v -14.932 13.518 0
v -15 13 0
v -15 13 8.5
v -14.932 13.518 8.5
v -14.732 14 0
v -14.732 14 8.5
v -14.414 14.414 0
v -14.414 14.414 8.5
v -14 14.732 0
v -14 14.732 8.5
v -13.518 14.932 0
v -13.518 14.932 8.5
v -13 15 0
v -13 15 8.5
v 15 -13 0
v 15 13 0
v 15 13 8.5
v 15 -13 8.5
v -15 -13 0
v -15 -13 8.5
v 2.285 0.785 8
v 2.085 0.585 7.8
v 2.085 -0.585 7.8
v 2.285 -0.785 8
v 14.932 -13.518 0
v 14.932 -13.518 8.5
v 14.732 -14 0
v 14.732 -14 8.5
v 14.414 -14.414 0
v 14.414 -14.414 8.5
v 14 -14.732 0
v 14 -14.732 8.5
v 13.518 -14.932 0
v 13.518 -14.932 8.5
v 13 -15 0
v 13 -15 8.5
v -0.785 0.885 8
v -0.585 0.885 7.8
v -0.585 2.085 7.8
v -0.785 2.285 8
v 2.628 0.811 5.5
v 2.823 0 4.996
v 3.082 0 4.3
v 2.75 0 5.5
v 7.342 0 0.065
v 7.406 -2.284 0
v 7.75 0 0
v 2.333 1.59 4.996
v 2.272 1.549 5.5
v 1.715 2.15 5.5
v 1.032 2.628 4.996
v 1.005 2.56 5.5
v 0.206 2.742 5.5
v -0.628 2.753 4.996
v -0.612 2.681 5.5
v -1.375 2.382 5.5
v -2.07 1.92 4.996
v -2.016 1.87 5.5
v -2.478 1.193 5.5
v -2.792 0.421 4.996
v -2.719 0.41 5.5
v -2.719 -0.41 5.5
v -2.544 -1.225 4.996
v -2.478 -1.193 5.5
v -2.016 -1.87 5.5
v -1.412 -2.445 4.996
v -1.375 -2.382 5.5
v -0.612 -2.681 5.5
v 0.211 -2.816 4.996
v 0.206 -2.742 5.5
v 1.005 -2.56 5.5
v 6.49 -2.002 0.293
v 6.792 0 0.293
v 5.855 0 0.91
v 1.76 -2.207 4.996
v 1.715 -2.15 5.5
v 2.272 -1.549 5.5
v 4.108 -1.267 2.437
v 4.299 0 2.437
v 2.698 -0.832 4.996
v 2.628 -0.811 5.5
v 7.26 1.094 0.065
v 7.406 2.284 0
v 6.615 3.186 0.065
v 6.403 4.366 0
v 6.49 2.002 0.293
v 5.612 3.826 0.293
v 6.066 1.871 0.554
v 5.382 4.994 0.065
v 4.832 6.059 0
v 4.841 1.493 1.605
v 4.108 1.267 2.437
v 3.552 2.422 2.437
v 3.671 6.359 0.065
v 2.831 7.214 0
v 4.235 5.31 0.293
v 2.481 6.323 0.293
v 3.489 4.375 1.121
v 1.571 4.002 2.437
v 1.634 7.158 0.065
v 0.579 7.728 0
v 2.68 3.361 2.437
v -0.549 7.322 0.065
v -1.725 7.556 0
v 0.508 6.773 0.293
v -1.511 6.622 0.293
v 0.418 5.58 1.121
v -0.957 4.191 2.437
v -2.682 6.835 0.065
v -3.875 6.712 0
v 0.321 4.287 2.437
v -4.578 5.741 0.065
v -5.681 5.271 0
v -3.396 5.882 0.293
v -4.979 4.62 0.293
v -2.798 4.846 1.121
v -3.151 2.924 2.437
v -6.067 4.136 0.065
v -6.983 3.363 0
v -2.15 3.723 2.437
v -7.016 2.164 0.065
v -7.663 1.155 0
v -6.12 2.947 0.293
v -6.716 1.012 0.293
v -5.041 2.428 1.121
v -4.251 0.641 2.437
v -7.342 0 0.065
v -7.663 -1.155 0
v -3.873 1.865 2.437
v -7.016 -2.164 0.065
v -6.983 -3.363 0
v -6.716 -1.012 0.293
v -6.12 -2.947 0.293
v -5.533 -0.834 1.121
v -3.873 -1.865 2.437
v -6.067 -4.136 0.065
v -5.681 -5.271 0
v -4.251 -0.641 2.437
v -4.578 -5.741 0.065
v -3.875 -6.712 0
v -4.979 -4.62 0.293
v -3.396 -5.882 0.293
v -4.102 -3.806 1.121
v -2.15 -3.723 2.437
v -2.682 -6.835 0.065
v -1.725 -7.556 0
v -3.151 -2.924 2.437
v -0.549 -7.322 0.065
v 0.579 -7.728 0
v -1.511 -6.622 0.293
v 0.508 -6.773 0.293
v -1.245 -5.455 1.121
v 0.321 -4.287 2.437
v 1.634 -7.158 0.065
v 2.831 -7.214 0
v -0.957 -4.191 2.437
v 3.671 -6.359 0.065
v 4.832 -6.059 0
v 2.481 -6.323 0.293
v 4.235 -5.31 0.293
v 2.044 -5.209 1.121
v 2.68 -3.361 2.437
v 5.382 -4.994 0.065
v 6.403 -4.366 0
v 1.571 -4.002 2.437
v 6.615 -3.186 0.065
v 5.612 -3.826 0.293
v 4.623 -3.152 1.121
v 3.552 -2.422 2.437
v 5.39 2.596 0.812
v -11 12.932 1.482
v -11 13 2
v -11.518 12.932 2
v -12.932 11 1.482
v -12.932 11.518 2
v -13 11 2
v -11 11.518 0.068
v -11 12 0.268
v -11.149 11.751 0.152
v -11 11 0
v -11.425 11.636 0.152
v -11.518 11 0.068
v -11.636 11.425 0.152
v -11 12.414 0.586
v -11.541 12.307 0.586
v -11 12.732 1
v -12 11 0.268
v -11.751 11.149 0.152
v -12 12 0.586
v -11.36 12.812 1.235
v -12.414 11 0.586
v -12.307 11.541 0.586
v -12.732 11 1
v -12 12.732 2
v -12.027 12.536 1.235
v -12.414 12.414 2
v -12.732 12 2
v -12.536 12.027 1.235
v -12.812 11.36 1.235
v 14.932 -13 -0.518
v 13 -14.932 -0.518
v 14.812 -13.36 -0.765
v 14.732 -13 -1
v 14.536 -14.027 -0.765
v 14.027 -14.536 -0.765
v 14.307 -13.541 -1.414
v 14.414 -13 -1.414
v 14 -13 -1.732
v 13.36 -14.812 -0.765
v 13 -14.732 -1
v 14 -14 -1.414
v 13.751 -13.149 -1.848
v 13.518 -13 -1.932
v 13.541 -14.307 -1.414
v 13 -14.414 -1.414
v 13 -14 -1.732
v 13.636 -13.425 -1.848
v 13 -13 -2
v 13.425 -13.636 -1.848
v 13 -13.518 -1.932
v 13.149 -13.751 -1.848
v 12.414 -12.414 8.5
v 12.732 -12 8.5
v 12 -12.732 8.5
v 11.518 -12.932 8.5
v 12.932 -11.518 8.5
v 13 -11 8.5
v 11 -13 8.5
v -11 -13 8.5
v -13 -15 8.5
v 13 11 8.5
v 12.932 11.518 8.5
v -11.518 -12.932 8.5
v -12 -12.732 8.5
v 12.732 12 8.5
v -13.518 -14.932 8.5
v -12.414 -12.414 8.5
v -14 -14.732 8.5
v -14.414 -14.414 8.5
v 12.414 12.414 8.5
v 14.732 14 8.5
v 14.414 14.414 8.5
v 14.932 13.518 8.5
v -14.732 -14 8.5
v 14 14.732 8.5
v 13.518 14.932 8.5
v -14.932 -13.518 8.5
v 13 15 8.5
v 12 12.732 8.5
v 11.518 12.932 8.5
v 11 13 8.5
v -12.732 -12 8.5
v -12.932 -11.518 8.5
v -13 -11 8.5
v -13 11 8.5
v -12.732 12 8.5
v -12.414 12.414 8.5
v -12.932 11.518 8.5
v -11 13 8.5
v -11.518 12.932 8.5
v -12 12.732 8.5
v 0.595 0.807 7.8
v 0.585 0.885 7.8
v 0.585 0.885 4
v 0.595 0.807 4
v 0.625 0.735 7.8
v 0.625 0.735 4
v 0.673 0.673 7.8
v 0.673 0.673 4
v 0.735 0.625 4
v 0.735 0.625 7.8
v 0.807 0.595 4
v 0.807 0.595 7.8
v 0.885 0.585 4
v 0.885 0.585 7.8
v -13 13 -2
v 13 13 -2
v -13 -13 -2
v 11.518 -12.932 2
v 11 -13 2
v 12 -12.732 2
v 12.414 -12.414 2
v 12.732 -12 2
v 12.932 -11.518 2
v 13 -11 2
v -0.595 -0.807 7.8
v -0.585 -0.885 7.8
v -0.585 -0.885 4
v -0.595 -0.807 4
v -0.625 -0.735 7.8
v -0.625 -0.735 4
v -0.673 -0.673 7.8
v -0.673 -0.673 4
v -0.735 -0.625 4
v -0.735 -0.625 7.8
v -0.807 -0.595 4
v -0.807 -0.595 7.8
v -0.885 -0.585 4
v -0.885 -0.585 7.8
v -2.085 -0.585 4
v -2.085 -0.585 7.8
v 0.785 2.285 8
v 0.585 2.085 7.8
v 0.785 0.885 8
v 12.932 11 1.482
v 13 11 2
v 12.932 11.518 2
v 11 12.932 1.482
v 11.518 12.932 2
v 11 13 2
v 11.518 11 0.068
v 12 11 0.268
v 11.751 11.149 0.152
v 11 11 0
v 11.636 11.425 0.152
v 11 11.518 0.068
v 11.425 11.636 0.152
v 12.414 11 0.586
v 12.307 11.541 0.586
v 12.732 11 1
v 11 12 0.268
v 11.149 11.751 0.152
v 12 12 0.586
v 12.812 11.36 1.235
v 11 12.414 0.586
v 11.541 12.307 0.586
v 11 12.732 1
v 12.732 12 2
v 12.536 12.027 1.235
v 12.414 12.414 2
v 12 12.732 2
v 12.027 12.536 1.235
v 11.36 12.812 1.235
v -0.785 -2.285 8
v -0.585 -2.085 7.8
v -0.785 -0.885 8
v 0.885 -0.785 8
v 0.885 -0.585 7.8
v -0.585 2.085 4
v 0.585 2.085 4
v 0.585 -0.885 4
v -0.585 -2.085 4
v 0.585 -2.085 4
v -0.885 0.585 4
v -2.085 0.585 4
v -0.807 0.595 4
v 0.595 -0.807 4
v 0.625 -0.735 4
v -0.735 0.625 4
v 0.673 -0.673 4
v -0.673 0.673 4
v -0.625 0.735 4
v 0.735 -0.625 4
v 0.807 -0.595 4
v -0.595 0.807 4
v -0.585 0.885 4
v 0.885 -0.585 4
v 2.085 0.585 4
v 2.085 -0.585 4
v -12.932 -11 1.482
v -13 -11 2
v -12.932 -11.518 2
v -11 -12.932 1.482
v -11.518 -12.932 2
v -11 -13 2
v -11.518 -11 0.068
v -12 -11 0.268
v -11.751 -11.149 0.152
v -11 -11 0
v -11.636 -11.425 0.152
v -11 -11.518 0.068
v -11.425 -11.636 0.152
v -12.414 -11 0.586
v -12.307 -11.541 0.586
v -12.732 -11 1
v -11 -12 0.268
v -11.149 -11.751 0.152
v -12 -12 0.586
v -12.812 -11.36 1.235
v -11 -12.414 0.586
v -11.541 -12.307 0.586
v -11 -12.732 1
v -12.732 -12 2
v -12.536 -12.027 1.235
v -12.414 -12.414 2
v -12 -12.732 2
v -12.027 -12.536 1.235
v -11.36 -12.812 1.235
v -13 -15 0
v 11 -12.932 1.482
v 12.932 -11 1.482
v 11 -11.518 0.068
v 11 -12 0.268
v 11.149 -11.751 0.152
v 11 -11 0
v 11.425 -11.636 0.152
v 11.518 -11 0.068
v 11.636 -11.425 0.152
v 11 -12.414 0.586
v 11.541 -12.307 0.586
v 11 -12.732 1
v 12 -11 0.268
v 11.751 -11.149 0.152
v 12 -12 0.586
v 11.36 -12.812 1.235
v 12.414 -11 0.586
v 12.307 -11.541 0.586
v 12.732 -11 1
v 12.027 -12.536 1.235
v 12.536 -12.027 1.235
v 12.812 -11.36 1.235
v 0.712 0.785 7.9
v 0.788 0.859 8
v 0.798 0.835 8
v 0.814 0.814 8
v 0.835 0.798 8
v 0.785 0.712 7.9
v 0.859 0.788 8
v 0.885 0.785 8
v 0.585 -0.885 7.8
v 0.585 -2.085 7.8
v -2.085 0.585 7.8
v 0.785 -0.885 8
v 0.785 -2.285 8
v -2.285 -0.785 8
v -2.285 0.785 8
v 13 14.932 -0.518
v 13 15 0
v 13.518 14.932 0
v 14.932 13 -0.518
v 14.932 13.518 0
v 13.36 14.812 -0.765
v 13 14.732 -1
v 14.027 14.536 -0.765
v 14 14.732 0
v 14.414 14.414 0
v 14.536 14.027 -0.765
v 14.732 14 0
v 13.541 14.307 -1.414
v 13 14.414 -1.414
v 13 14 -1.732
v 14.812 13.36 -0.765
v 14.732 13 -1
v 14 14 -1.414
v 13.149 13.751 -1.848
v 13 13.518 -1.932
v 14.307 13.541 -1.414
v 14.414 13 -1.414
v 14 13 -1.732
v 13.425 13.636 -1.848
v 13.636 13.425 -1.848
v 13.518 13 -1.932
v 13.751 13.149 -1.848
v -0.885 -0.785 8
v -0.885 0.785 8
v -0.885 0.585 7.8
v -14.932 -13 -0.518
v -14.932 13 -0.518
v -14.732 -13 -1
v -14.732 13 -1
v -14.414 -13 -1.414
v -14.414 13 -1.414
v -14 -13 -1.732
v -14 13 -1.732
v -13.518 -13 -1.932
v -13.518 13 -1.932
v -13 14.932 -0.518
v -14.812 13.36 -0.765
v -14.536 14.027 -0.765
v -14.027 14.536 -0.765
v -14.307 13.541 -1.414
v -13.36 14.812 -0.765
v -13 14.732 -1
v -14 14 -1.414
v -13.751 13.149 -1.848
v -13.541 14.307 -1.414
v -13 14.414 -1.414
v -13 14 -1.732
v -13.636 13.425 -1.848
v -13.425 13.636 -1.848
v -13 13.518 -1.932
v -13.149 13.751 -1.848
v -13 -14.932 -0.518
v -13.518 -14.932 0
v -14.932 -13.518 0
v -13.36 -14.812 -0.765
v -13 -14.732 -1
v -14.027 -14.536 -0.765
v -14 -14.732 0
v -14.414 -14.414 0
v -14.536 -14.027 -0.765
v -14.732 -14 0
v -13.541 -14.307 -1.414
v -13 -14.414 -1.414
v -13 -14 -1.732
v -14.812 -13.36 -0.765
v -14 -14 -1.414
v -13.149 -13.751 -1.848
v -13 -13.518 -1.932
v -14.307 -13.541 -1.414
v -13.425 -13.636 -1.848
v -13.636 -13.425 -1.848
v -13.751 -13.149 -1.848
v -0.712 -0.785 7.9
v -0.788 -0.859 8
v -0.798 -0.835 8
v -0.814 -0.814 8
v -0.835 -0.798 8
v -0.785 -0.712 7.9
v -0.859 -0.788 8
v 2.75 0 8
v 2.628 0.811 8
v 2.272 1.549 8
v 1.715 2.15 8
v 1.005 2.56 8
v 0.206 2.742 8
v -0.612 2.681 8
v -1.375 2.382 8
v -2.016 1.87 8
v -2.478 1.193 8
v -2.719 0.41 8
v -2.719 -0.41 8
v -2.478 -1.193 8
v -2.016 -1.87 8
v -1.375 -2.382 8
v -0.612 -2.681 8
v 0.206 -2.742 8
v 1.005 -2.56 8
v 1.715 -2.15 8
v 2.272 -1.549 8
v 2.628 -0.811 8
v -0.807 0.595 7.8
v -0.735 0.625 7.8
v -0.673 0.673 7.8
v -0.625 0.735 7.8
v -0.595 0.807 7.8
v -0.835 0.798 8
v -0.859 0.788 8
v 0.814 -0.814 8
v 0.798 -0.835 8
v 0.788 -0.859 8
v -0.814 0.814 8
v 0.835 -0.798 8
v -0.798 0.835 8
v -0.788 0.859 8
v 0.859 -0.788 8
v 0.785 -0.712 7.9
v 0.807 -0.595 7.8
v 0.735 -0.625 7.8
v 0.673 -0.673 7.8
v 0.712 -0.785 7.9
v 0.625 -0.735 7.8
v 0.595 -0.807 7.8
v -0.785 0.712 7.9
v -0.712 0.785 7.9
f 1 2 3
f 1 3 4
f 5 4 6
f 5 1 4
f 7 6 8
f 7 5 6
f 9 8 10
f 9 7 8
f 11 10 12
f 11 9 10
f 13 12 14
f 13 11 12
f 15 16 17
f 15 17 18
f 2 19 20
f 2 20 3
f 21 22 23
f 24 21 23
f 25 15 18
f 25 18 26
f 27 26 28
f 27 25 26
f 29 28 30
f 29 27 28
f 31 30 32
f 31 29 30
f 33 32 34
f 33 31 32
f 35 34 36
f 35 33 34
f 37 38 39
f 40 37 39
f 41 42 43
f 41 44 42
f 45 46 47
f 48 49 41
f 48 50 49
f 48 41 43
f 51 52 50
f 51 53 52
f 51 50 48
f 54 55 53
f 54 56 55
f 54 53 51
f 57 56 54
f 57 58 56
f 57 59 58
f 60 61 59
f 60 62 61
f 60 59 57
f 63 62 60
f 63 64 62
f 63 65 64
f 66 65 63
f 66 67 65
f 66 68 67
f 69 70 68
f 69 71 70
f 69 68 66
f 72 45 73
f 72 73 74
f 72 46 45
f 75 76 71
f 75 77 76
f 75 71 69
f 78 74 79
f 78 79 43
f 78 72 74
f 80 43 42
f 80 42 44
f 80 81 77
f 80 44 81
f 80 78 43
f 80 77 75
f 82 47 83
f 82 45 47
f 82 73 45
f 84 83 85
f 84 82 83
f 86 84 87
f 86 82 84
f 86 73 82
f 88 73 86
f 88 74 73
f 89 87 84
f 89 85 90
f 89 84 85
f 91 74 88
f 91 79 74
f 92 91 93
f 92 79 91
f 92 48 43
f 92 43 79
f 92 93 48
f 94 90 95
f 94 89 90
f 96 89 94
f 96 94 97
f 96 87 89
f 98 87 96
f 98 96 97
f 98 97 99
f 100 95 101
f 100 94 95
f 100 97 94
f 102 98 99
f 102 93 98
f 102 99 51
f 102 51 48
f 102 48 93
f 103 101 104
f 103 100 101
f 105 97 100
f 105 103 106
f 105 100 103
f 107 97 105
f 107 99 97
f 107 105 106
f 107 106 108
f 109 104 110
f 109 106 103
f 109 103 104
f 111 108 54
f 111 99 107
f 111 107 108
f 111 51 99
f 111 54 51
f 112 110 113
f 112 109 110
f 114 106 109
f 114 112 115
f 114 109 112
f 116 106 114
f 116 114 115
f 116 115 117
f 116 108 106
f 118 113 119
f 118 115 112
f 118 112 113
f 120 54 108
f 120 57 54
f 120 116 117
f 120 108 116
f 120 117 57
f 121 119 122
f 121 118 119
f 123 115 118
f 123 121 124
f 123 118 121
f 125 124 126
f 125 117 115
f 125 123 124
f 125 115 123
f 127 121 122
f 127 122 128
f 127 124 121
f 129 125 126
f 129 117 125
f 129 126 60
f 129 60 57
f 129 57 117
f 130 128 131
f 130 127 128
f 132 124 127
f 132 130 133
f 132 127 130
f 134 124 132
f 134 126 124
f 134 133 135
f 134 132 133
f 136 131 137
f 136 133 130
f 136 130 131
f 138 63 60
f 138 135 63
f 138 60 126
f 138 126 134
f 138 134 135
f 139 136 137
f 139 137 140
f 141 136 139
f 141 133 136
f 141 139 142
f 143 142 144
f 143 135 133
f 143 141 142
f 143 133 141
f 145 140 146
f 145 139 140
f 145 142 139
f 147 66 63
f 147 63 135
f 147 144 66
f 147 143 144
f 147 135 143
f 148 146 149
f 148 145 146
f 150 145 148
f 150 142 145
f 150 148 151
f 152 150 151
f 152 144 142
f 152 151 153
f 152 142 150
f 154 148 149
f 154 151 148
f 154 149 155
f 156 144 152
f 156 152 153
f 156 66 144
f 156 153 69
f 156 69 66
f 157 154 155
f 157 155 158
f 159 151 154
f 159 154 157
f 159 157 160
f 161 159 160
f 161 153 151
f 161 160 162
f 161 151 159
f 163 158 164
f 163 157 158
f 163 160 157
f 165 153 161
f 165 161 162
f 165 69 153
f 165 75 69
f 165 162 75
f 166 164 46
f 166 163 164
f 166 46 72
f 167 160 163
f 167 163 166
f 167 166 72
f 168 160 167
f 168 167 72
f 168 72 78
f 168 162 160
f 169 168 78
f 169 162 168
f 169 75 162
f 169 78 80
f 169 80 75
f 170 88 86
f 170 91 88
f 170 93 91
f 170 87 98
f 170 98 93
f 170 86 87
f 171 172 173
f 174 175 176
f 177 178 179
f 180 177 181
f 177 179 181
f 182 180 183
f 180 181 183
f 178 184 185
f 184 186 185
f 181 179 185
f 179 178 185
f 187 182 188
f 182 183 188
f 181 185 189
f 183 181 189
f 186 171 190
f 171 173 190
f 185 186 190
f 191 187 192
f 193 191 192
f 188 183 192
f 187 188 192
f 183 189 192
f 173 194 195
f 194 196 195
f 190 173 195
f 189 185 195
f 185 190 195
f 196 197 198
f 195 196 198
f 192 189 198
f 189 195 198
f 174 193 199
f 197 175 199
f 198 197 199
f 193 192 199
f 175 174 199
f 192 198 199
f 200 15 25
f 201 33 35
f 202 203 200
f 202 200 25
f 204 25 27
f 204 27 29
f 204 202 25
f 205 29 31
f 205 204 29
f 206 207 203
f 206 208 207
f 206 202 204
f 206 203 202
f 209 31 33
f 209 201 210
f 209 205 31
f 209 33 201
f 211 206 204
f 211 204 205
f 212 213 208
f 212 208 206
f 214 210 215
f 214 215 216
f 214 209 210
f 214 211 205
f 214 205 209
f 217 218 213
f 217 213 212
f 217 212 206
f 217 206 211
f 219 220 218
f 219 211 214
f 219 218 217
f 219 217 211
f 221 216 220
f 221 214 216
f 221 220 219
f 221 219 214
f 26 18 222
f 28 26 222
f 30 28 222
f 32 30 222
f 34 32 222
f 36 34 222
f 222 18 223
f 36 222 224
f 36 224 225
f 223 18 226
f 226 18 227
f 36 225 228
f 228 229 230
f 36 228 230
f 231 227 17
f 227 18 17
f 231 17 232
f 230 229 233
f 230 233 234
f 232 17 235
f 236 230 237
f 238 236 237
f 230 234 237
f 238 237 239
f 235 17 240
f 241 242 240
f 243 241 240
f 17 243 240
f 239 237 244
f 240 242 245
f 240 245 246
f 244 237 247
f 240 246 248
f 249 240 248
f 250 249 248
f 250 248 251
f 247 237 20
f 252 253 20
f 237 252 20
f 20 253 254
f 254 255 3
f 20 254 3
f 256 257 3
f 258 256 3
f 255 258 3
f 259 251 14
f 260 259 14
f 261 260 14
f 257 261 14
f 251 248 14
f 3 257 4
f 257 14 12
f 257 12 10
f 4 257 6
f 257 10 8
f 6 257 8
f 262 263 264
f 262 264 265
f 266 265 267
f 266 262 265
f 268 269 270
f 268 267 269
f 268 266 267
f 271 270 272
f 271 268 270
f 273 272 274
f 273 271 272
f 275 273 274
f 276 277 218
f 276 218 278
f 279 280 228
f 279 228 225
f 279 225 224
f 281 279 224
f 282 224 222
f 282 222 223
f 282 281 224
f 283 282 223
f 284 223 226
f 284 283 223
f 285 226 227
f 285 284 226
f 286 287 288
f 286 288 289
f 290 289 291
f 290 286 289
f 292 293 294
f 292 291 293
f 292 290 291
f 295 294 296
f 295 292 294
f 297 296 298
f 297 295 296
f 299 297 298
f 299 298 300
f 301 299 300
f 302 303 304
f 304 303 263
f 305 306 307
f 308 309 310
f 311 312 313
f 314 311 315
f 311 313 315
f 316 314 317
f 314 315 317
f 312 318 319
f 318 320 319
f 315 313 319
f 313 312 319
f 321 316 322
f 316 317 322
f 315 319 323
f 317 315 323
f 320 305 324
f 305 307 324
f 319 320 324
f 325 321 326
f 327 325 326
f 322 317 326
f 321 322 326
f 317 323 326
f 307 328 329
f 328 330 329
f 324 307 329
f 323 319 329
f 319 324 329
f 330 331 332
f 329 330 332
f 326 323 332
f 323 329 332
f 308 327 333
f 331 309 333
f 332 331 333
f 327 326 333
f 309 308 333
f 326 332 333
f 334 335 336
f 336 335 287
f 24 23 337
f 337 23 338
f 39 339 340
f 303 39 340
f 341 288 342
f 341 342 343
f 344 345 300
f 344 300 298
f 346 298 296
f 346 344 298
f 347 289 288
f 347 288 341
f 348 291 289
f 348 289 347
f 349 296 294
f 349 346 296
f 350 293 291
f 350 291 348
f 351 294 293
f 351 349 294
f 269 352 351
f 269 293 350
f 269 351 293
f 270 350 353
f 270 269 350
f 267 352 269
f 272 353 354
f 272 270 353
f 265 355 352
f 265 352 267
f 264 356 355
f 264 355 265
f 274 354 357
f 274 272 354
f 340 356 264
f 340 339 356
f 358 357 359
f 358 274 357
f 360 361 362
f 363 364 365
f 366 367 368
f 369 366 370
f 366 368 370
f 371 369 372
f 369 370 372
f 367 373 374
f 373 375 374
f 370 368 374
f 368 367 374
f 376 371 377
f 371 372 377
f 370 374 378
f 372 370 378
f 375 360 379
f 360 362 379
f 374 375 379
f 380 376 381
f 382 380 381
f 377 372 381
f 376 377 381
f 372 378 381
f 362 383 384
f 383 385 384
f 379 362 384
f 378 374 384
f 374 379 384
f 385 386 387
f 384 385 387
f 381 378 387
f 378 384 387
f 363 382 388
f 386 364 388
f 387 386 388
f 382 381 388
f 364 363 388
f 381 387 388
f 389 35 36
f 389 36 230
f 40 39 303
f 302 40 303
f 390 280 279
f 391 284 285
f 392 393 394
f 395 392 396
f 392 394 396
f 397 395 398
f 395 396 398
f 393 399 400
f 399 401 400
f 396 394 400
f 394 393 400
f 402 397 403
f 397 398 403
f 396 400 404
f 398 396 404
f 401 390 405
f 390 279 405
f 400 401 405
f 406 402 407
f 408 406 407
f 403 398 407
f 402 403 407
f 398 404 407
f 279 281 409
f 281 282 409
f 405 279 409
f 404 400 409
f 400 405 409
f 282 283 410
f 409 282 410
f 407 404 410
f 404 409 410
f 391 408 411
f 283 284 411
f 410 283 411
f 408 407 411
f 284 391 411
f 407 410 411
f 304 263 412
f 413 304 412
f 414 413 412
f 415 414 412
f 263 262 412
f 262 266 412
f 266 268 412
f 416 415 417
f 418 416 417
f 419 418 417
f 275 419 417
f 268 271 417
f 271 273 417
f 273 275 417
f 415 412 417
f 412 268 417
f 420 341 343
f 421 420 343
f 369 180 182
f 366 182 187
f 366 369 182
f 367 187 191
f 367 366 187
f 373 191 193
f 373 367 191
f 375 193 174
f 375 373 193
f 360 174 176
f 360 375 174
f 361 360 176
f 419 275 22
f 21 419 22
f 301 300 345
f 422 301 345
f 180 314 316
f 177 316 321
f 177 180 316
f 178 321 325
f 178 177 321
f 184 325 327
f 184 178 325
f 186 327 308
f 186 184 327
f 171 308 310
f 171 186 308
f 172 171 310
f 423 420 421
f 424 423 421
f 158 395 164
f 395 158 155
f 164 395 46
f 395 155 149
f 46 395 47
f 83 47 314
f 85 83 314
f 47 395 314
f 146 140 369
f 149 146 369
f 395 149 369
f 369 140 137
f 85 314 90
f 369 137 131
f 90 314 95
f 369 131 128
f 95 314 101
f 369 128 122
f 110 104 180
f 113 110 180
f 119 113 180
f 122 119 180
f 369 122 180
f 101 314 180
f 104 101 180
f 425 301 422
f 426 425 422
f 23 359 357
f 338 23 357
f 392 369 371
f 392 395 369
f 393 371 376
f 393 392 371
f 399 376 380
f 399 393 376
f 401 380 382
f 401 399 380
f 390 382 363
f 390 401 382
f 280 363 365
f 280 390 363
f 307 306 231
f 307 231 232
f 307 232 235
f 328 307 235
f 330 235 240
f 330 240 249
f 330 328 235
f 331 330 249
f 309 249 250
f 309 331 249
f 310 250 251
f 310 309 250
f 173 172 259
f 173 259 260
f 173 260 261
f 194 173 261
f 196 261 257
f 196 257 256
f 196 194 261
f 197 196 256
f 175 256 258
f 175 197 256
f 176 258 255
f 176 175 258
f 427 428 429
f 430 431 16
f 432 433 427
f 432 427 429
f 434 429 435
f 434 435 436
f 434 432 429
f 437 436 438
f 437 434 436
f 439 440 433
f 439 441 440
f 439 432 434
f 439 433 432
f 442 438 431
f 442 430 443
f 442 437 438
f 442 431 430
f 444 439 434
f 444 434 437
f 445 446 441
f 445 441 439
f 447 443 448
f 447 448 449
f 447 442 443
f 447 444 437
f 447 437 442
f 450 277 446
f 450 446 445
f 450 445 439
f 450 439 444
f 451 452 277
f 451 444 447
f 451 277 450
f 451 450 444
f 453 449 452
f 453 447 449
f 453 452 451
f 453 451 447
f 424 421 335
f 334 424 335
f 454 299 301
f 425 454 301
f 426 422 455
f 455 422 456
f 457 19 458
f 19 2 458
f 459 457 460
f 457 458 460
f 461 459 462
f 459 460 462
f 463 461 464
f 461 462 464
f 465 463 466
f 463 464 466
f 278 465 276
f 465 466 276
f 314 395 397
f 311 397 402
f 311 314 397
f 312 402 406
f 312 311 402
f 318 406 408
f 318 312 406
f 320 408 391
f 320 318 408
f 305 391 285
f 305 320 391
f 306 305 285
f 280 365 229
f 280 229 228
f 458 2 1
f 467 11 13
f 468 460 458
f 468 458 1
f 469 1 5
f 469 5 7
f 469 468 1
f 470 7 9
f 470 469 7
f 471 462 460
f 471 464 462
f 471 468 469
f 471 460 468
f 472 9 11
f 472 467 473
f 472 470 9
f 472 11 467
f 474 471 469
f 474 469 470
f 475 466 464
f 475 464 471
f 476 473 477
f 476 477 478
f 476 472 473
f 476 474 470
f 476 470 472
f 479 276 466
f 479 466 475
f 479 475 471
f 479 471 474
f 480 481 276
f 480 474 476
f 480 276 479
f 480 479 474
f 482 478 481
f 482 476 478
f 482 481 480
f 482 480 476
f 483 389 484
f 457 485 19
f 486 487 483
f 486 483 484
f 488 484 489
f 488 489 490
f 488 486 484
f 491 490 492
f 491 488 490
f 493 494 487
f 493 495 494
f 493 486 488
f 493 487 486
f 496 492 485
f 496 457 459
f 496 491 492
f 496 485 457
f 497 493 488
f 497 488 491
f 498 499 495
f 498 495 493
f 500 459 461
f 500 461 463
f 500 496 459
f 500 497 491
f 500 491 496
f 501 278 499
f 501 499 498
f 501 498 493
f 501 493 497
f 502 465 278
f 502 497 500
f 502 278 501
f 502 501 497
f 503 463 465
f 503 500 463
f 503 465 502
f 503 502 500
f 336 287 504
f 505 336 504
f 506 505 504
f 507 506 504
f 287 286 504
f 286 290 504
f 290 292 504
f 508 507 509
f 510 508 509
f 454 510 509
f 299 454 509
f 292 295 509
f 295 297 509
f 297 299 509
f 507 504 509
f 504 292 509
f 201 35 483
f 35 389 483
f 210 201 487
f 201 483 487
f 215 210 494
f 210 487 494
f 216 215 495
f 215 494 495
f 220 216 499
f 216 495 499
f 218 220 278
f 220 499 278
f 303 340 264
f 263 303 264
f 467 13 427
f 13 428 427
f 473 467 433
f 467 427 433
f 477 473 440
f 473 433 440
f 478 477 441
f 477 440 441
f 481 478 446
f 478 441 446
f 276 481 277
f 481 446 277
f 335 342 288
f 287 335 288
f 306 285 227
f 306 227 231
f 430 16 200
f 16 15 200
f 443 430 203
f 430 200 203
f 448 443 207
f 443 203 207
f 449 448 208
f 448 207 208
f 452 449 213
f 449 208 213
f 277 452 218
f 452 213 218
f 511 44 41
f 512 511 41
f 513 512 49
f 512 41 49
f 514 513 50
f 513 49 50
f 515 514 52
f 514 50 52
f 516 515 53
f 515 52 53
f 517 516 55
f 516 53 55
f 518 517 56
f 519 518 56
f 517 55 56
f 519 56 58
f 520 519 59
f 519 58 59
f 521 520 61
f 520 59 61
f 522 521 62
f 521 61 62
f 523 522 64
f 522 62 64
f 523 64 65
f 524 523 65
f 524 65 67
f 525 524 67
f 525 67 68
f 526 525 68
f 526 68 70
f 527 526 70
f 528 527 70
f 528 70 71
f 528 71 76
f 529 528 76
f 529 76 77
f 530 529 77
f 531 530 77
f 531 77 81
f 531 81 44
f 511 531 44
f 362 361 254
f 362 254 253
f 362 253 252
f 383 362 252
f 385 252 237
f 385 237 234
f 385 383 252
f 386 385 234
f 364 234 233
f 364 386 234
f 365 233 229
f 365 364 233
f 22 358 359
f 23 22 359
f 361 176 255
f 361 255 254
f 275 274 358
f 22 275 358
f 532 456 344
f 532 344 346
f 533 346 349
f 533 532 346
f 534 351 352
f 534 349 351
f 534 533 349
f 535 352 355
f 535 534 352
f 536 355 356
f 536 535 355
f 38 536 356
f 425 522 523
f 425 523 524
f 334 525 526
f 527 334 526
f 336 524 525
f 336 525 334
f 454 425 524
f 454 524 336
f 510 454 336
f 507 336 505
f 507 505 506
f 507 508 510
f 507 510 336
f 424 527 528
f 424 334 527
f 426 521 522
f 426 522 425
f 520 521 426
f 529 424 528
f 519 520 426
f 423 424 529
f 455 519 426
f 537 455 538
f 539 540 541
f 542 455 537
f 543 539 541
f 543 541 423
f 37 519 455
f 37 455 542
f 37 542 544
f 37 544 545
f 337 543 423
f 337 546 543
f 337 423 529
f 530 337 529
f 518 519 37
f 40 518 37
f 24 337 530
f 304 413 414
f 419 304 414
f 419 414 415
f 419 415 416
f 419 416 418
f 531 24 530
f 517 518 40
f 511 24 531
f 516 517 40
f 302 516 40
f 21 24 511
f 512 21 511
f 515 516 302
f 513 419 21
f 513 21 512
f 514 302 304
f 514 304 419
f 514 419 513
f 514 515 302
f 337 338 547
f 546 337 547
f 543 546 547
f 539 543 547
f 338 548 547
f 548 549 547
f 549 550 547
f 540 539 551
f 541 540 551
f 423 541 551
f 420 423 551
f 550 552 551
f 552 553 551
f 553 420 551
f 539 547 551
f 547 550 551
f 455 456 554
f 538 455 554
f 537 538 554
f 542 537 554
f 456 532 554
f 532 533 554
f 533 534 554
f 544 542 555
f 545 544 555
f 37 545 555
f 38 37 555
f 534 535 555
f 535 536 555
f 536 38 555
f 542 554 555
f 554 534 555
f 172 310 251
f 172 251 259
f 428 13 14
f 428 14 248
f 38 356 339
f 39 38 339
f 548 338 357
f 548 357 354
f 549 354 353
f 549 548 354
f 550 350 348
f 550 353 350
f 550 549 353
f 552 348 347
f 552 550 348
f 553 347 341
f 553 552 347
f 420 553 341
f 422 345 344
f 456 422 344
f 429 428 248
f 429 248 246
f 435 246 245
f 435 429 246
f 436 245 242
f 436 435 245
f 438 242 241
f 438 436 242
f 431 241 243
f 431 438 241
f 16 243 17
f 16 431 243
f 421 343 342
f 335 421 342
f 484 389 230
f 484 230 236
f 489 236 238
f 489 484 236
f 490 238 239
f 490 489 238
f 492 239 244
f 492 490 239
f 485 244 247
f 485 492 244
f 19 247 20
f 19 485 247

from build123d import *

# Parameters (mm, degrees)
EXTRUDE_1_DEPTH = 8.5
SKETCH_1_6_R    = 2.75
EXTRUDE_2_DEPTH = 8
EXTRUDE_START   = -2
EXTRUDE_3_DEPTH = 2
FILLET_4_R      = 0.3
FILLET_1_R      = 2
CHAMFER_1_SIZE  = 0.2
FILLET_2_R      = 2
FILLET_3_SIZE   = 5
FILLET_3_SIZE_2 = 5.5
EXTRUDE_START_2 = 4
EXTRUDE_4_DEPTH = 4


with BuildPart() as part:
    # 草图1 → 凸台-拉伸1 (new body)
    with BuildSketch(Plane.XY):
        with BuildLine():
            ThreePointArc((-15, 13), (-14.414213562, 14.414213562), (-13, 15))
            Line((-13, 15), (13, 15))
            ThreePointArc((13, 15), (14.414213562, 14.414213562), (15, 13))
            Line((15, 13), (15, -13))
            ThreePointArc((15, -13), (14.414213562, -14.414213562), (13, -15))
            Line((13, -15), (-13, -15))
            ThreePointArc((-13, -15), (-14.414213562, -14.414213562), (-15, -13))
            Line((-15, -13), (-15, 13))
        make_face()
        with BuildLine():
            ThreePointArc((-13, -11), (-12.414213562, -12.414213562), (-11, -13))
            Line((-11, -13), (11, -13))
            ThreePointArc((11, -13), (12.414213562, -12.414213562), (13, -11))
            Line((13, -11), (13, 11))
            ThreePointArc((13, 11), (12.414213562, 12.414213562), (11, 13))
            Line((11, 13), (-11, 13))
            ThreePointArc((-11, 13), (-12.414213562, 12.414213562), (-13, 11))
            Line((-13, 11), (-13, -11))
        make_face(mode=Mode.SUBTRACT)
    extrude(amount=EXTRUDE_1_DEPTH)



with BuildPart() as body_2:
    # 草图1<6> → 凸台-拉伸2 (new body)
    with BuildSketch(Plane.XY):
        Circle(SKETCH_1_6_R)
        Polygon((-2.085, -0.585), (-2.085, 0.585), (-0.585, 0.585), (-0.585, 2.085), (0.585, 2.085), (0.585, 0.585), (2.085, 0.585), (2.085, -0.585), (0.585, -0.585), (0.585, -2.085), (-0.585, -2.085), (-0.585, -0.585), align=None, mode=Mode.SUBTRACT)
    extrude(amount=EXTRUDE_2_DEPTH)


with BuildPart() as part_1:
    add(part.part)

    add(body_2.part)  # 凸台-拉伸3 merges body 2
    # 草图1<7> → 凸台-拉伸3 (add)
    with BuildSketch(Plane.XY.offset(EXTRUDE_START)):
        with BuildLine():
            Line((-13, 15), (13, 15))
            ThreePointArc((13, 15), (14.414213562, 14.414213562), (15, 13))
            Line((15, 13), (15, -13))
            ThreePointArc((15, -13), (14.414213562, -14.414213562), (13, -15))
            Line((13, -15), (-13, -15))
            ThreePointArc((-13, -15), (-14.414213562, -14.414213562), (-15, -13))
            Line((-15, -13), (-15, 13))
            ThreePointArc((-15, 13), (-14.414213562, 14.414213562), (-13, 15))
        make_face()
    extrude(amount=EXTRUDE_3_DEPTH)

    # 圆角4
    fillet_4_edges = [part_1.edges().sort_by_distance(p)[0] for p in [
        (0.585, 0.585, 4),
        (0.585, -0.585, 4),
        (-0.585, -0.585, 4),
        (-0.585, 0.585, 4),
    ]]
    fillet(fillet_4_edges, radius=FILLET_4_R)

    # 圆角1
    fillet_1_edges = [part_1.edges().sort_by_distance(p)[0] for p in [
        (-14.414213562, -14.414213562, -2),
        (-15, 0, -2),
        (14.414213562, 14.414213562, -2),
        (14.414213562, -14.414213562, -2),
        (0, -15, -2),
        (-14.414213562, 14.414213562, -2),
        (0, 15, -2),
        (15, 0, -2),
    ]]
    fillet(fillet_1_edges, radius=FILLET_1_R)

    # 倒角1
    chamfer_1_edges = [part_1.edges().sort_by_distance(p)[0] for p in [
        (1.485, 0.585, 8),
        (1.485, -0.585, 8),
        (0.585, -1.485, 8),
        (-0.585, -1.485, 8),
        (0.672867966, -0.672867966, 8),
        (-0.672867966, -0.672867966, 8),
        (0.672867966, 0.672867966, 8),
        (-0.672867966, 0.672867966, 8),
        (0, -2.085, 8),
        (-1.485, -0.585, 8),
        (-2.085, 0, 8),
        (-0.585, 1.485, 8),
        (0, 2.085, 8),
        (0.585, 1.485, 8),
        (2.085, 0, 8),
        (-1.485, 0.585, 8),
    ]]
    chamfer(chamfer_1_edges, length=CHAMFER_1_SIZE)

    # 圆角2
    fillet_2_edges = [part_1.edges().sort_by_distance(p)[0] for p in [
        (0, -13, 0),
        (12.414213562, -12.414213562, 0),
        (13, 0, 0),
        (12.414213562, 12.414213562, 0),
        (0, 13, 0),
        (-12.414213562, 12.414213562, 0),
        (-13, 0, 0),
        (-12.414213562, -12.414213562, 0),
    ]]
    fillet(fillet_2_edges, radius=FILLET_2_R)

    # 圆角3
    # a fillet whose section is not a circle: 5.5, 5 mm, written as the material it adds along each edge
    with BuildSketch(Plane(origin=(0, 0, 0), x_dir=(1, 0, 0), z_dir=(0, -1, 0))) as fillet_3_piece_1:
        with BuildLine():
            Bezier((2.75 + FILLET_3_SIZE, 0), (2.75, 0), (2.75, FILLET_3_SIZE_2), weights=[1, 0.333333333, 1])
            Line((2.75, FILLET_3_SIZE_2), (2.75, 0))
            Line((2.75, 0), (2.75 + FILLET_3_SIZE, 0))
        make_face()
    revolve(axis=Axis((0, 0, 0), (0, 0, 1)))

    # 草图3 → 凸台-拉伸4 (add)
    with BuildSketch(Plane.XY.offset(EXTRUDE_START_2)):
        with BuildLine():
            Line((0.585, 0.885), (0.585, 2.085))
            Line((0.585, 2.085), (-0.585, 2.085))
            Line((-0.585, 2.085), (-0.585, 0.885))
            ThreePointArc((-0.585, 0.885), (-0.672867966, 0.672867966), (-0.885, 0.585))
            Line((-0.885, 0.585), (-2.085, 0.585))
            Line((-2.085, 0.585), (-2.085, -0.585))
            Line((-2.085, -0.585), (-0.885, -0.585))
            ThreePointArc((-0.885, -0.585), (-0.672867966, -0.672867966), (-0.585, -0.885))
            Line((-0.585, -0.885), (-0.585, -2.085))
            Line((-0.585, -2.085), (0.585, -2.085))
            Line((0.585, -2.085), (0.585, -0.885))
            ThreePointArc((0.585, -0.885), (0.672867966, -0.672867966), (0.885, -0.585))
            Line((0.885, -0.585), (2.085, -0.585))
            Line((2.085, -0.585), (2.085, 0.585))
            Line((2.085, 0.585), (0.885, 0.585))
            ThreePointArc((0.885, 0.585), (0.672867966, 0.672867966), (0.585, 0.885))
        make_face()
    extrude(amount=-EXTRUDE_4_DEPTH)


solid = part_1.part
